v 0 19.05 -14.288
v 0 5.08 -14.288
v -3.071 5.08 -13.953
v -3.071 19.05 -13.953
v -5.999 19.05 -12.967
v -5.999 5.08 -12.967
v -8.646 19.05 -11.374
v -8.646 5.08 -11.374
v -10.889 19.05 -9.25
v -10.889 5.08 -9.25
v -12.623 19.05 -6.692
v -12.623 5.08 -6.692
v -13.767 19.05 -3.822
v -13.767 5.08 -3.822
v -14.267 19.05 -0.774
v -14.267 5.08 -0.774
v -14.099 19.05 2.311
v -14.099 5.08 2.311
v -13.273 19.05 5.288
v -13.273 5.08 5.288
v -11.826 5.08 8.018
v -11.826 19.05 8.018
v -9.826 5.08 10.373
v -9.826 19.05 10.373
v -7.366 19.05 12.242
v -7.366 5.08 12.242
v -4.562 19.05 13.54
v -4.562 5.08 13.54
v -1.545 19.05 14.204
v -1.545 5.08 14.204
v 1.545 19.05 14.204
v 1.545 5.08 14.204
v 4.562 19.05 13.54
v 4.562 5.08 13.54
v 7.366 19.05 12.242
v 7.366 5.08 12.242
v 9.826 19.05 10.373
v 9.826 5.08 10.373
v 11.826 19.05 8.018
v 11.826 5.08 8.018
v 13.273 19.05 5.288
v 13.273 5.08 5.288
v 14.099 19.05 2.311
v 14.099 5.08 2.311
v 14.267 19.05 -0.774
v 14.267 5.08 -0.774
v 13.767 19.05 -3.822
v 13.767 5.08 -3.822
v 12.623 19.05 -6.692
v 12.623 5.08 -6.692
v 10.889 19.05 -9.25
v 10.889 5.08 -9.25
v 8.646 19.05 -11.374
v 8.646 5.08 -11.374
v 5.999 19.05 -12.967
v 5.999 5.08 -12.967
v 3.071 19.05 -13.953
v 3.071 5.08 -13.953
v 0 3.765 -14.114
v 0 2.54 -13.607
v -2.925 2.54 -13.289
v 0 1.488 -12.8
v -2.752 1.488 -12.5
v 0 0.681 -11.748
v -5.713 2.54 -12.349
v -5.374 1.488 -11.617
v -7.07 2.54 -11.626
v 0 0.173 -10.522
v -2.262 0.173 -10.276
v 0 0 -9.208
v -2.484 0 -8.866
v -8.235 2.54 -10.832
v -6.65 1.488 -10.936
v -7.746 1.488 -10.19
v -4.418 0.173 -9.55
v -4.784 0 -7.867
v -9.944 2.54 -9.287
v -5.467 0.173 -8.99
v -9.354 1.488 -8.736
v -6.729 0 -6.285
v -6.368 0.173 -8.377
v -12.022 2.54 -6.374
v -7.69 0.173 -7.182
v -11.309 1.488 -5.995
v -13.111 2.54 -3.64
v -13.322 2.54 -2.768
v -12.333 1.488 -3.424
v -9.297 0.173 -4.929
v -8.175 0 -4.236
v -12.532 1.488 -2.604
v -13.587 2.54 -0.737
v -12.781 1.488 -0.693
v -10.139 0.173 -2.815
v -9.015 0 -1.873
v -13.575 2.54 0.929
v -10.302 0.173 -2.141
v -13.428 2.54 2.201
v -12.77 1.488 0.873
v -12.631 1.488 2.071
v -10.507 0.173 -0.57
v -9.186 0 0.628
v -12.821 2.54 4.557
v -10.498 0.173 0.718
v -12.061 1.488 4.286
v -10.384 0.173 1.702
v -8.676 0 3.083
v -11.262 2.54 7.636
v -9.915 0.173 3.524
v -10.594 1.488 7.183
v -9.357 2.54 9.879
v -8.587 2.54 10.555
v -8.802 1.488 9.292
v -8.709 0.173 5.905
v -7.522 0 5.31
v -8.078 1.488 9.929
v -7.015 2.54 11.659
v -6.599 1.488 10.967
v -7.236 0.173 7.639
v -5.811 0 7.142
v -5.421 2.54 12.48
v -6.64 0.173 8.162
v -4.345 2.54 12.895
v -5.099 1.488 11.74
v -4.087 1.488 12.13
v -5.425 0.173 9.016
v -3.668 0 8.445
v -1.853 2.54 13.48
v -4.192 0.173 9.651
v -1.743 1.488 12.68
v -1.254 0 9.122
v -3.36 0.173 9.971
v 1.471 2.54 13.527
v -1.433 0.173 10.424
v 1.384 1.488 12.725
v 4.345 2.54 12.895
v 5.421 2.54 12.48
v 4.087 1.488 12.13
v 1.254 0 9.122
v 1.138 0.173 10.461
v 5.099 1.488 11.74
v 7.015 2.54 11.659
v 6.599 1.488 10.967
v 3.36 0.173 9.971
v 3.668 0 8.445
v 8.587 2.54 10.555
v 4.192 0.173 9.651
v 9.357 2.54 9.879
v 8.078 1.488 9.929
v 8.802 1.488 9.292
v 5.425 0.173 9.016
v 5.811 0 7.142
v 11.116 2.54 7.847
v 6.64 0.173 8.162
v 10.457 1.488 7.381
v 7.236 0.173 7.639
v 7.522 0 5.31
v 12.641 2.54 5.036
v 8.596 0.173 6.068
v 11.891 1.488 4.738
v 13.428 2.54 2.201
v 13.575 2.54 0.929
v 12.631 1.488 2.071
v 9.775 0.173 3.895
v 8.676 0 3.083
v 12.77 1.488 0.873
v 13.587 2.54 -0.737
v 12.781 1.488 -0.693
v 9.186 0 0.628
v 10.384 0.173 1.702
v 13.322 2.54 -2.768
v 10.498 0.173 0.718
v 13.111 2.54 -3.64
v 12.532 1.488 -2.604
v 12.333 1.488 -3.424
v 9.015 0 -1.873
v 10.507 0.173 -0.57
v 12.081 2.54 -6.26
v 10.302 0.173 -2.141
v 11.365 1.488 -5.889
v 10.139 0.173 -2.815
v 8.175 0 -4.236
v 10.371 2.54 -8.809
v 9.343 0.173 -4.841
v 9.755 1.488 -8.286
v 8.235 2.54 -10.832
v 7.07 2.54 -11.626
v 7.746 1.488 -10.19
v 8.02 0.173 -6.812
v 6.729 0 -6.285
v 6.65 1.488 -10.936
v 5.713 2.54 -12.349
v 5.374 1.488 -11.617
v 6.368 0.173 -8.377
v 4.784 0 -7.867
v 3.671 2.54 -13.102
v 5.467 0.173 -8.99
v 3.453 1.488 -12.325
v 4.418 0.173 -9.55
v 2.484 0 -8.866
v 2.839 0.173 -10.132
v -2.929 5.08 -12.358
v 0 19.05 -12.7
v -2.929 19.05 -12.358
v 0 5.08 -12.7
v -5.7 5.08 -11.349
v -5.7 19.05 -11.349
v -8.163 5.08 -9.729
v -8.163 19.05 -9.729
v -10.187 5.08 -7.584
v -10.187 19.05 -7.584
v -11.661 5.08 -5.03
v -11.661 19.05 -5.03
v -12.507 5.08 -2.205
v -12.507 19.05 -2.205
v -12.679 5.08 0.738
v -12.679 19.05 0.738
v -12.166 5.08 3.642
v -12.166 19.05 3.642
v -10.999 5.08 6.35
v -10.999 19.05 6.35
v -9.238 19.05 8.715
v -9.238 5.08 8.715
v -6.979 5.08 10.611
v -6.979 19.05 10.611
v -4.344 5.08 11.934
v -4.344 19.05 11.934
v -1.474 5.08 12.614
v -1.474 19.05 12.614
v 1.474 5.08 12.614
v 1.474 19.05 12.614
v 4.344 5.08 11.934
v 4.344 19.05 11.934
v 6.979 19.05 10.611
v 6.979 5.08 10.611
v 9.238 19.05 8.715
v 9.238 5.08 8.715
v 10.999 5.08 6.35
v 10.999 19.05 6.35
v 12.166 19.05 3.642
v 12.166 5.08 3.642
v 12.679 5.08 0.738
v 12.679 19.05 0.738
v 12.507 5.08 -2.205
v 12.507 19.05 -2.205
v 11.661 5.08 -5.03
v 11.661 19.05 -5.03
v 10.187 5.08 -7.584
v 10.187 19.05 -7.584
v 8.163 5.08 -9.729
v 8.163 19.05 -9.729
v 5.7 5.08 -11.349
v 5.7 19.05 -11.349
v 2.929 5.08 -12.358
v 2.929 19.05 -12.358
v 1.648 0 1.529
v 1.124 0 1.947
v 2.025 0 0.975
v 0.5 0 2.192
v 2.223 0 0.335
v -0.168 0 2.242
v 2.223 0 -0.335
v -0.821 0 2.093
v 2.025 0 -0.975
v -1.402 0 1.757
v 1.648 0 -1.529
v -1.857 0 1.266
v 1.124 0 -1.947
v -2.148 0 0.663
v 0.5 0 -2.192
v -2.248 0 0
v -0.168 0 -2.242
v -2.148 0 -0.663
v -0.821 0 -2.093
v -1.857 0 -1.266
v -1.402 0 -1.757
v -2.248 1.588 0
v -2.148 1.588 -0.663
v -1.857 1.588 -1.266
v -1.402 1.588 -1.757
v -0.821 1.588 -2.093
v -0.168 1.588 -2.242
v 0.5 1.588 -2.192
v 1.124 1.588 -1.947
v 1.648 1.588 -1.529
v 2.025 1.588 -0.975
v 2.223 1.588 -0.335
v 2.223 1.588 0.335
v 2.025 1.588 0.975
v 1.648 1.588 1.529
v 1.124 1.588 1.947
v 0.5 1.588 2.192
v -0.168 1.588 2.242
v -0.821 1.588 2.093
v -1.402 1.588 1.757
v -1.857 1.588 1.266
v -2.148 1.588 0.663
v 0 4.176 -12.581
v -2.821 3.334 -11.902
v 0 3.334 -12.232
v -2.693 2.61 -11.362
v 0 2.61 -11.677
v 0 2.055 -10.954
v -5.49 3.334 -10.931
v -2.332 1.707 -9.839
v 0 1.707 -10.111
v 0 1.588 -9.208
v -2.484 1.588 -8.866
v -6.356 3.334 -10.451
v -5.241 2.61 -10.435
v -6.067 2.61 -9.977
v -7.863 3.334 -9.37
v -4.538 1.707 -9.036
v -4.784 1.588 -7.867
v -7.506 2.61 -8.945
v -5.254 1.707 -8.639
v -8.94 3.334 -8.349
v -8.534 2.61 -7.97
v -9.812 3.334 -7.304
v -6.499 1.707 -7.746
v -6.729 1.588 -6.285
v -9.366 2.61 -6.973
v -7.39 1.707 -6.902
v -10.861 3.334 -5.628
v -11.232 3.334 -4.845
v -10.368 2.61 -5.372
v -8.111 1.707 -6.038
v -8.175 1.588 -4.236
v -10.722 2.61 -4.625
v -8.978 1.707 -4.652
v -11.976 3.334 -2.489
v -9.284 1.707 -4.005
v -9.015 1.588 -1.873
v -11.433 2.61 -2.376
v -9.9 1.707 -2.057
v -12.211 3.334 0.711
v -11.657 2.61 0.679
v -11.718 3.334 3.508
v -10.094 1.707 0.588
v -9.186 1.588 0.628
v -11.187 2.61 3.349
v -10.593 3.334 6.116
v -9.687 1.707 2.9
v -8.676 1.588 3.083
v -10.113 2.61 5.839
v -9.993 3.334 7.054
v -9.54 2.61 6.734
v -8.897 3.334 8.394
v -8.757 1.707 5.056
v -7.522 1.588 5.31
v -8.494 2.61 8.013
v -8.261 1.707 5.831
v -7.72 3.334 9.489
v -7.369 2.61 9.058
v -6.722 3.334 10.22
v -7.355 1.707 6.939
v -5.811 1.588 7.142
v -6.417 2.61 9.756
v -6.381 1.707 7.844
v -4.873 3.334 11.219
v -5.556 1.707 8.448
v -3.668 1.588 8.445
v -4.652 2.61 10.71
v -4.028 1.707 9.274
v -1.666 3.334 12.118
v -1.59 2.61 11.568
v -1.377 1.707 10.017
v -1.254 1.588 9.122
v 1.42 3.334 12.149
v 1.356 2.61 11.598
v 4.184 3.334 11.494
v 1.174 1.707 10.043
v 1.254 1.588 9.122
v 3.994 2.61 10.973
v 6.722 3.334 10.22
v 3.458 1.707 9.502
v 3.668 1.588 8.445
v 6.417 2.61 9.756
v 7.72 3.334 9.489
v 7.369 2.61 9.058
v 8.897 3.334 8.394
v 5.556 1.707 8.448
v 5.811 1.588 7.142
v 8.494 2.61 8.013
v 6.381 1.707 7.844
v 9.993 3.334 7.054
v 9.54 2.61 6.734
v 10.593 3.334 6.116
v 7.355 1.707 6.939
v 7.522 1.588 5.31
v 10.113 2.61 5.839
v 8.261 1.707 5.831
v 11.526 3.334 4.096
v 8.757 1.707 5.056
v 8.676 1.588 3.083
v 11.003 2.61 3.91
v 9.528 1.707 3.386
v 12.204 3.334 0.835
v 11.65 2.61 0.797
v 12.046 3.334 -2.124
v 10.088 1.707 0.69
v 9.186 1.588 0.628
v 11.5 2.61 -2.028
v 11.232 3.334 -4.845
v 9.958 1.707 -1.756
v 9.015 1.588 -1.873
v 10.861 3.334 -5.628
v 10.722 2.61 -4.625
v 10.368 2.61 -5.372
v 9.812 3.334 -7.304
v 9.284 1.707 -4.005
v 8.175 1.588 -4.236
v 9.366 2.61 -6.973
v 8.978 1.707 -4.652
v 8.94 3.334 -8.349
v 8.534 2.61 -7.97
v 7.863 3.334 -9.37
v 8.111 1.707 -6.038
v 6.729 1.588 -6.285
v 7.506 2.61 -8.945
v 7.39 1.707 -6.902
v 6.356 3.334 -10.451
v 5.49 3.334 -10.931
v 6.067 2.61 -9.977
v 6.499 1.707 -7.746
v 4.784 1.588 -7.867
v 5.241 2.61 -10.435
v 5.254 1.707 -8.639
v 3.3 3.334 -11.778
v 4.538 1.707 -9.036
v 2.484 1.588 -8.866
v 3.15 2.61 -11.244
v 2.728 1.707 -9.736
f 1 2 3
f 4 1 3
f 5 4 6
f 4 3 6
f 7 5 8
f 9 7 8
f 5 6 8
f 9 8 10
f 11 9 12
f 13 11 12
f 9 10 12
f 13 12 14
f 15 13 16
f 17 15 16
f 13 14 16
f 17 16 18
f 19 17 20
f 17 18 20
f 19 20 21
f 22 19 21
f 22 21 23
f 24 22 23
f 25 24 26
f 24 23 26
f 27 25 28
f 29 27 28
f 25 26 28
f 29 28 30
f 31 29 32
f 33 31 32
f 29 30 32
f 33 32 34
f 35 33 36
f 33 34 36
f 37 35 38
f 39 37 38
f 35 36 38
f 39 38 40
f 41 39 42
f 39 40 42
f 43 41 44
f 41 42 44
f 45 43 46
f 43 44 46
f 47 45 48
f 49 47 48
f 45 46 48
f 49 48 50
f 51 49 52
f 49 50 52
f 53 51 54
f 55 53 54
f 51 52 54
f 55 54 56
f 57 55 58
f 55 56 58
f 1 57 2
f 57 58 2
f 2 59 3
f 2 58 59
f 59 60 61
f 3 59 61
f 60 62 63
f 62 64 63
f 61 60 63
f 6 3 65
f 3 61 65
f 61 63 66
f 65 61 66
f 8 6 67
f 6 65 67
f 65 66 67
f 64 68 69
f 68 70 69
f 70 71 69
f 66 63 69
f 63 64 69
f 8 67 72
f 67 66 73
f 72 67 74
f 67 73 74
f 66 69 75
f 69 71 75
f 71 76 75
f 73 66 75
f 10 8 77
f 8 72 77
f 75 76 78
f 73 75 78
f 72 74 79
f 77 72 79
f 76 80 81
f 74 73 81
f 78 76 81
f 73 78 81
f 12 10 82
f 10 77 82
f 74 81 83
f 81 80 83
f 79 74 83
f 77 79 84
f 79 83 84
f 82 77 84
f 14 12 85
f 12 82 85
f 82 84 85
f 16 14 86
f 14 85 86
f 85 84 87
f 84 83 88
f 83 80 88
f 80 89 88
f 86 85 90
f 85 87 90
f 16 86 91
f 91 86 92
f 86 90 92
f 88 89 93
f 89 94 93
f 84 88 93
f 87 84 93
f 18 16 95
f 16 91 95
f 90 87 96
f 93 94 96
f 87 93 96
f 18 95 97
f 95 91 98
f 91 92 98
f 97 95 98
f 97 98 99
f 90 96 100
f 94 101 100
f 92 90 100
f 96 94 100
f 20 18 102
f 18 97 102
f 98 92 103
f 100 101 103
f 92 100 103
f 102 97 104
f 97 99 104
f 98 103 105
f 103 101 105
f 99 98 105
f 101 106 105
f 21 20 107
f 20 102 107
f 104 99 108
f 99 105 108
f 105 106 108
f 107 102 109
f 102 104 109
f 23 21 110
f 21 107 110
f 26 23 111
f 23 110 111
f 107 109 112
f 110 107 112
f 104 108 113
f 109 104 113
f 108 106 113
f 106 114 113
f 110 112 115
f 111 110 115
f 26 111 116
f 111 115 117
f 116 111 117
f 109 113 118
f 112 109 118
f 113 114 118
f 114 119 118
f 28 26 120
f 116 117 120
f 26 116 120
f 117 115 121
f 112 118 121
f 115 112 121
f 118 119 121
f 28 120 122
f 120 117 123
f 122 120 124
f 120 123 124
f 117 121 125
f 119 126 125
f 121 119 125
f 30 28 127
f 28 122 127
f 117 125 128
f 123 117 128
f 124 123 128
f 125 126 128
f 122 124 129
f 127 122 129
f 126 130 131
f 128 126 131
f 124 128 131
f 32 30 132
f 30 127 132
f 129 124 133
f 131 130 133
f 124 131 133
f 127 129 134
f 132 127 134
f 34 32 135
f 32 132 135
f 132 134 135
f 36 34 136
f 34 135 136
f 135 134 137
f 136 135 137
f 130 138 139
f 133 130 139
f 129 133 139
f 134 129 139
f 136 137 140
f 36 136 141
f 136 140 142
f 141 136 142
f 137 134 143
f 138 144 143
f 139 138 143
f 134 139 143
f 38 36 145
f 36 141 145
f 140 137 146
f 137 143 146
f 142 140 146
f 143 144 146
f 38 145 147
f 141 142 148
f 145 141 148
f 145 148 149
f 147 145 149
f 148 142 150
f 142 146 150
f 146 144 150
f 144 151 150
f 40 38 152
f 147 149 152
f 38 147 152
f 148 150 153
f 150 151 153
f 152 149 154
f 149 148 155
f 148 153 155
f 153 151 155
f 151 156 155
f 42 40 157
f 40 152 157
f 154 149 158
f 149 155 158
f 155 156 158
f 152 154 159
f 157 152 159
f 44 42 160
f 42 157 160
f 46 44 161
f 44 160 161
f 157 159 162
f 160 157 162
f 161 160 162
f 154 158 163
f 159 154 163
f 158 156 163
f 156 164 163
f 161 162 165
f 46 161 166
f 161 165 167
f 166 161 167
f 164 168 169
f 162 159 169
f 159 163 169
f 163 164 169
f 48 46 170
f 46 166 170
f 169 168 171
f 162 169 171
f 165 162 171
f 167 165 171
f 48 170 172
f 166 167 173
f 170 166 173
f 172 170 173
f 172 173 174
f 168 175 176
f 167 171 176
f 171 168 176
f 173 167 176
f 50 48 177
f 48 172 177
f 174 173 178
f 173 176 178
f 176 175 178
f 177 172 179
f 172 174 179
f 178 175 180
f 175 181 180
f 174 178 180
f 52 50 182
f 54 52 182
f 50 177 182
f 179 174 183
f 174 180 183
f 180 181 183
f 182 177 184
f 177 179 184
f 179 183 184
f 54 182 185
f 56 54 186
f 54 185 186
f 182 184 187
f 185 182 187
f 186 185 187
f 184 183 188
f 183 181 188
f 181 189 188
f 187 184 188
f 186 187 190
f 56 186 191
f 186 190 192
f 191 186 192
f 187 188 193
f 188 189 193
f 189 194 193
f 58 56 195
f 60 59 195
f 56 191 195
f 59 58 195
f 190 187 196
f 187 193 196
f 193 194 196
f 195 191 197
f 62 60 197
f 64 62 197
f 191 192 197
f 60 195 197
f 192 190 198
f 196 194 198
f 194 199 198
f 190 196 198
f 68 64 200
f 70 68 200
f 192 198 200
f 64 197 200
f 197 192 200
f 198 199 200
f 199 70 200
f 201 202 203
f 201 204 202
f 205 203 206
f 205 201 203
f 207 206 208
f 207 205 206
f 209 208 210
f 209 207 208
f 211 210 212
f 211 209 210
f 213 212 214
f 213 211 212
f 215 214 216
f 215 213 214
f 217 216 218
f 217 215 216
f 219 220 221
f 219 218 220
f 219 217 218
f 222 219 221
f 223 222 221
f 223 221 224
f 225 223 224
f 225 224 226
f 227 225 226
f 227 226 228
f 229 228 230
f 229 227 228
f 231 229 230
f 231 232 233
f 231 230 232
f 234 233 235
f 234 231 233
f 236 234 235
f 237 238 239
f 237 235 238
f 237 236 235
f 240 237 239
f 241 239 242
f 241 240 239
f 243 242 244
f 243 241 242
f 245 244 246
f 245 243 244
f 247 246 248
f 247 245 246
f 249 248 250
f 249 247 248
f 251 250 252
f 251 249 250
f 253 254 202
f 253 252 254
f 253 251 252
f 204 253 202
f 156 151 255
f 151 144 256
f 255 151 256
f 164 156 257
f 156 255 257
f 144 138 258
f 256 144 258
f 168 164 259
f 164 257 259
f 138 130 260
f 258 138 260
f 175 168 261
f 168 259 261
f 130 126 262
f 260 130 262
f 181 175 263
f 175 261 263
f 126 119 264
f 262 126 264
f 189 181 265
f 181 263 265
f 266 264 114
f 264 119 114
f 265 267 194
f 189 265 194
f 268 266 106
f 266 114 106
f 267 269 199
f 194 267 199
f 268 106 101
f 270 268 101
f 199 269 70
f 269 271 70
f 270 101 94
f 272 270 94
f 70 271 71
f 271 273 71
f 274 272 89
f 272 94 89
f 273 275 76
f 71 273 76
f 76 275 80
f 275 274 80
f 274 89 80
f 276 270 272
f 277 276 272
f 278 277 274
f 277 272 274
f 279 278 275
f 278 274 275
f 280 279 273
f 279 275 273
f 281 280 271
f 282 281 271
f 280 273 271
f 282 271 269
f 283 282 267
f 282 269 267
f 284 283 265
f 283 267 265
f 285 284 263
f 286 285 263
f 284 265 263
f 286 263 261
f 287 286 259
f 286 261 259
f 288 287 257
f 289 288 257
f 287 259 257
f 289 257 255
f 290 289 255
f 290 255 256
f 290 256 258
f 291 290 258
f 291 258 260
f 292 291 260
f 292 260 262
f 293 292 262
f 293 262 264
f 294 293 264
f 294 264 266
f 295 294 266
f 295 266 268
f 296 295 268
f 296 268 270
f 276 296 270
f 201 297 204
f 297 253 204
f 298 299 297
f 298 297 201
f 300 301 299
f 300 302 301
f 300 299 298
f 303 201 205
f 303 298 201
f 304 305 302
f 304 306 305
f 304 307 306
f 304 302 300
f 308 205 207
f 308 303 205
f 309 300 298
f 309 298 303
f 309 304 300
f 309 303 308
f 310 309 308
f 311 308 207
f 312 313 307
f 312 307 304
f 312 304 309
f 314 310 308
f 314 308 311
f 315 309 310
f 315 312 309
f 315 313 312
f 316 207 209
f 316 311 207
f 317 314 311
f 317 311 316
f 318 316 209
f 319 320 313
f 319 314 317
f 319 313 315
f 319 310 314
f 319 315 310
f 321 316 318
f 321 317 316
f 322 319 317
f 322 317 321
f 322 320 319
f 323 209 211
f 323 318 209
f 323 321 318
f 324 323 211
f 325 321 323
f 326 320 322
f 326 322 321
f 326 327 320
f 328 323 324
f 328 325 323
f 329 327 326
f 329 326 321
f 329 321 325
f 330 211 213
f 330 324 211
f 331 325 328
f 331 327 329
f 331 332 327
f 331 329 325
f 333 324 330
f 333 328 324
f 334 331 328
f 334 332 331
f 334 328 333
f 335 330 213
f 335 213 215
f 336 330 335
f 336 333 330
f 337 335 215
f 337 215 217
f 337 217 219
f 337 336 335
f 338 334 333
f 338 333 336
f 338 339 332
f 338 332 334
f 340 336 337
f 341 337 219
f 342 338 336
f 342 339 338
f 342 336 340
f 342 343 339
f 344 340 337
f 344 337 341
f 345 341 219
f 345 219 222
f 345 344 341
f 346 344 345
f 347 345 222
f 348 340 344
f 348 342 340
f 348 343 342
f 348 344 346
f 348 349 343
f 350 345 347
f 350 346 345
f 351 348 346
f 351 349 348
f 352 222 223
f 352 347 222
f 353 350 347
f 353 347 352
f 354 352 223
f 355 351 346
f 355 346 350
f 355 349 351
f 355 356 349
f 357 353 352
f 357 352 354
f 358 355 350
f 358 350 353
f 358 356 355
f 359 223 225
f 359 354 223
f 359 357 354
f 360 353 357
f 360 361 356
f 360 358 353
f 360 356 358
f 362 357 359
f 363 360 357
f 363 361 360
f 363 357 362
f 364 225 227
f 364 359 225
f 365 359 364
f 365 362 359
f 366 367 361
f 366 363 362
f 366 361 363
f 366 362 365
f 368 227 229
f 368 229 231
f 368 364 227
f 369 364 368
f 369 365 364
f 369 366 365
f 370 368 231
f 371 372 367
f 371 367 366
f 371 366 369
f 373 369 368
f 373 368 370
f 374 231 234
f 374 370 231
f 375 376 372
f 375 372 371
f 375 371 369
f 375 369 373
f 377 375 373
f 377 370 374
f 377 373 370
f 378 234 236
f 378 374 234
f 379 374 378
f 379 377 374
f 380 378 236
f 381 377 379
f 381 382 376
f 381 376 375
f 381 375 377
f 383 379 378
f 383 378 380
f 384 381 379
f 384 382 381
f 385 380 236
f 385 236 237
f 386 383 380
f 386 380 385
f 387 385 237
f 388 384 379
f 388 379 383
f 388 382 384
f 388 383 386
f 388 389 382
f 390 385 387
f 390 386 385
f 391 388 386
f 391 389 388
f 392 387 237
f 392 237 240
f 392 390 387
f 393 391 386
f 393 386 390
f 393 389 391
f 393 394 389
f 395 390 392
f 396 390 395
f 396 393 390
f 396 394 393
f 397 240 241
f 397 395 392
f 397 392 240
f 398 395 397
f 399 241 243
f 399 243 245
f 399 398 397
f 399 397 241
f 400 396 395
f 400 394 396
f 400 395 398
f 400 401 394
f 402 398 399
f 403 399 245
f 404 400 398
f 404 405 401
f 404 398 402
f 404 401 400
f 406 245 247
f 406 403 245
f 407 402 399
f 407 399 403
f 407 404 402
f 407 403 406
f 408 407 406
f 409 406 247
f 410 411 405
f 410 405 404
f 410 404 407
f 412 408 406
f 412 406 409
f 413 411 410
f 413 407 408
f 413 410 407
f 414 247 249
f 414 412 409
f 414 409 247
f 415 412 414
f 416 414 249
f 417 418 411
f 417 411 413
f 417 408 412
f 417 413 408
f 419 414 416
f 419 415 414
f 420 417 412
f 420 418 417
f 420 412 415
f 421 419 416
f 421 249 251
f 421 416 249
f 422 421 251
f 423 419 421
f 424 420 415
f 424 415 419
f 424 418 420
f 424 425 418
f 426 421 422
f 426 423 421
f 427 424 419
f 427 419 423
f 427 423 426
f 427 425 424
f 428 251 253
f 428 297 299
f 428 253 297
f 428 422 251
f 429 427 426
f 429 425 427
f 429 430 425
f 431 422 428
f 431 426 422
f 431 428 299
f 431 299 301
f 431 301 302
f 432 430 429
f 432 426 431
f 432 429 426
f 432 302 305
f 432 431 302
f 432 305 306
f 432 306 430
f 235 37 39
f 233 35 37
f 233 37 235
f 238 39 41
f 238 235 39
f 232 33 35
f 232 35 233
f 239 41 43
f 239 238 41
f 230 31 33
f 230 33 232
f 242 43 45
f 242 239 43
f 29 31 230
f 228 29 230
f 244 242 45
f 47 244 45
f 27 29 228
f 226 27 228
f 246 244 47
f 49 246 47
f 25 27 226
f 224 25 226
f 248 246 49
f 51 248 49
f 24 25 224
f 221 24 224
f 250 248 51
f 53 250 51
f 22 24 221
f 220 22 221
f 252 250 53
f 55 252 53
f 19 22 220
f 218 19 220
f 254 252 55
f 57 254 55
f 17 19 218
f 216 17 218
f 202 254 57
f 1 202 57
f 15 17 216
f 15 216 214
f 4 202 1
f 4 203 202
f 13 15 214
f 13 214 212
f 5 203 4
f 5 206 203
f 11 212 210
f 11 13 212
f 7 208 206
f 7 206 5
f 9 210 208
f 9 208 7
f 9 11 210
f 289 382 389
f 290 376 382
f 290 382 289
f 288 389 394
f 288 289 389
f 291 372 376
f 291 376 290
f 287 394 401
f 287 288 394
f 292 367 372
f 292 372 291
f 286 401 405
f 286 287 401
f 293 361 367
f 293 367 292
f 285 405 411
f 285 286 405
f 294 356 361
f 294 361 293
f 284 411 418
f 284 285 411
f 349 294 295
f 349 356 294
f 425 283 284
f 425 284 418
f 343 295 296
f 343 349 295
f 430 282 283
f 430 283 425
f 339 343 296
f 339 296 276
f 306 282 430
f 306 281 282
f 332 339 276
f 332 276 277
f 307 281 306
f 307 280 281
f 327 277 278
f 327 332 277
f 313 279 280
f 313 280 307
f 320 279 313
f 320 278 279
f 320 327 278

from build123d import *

# Parameters (mm, degrees)
SKETCH1_R                 = 14.2875
BOSS_EXTRUDE1_DEPTH       = 19.05
FILLET1_R                 = 5.08
SHELL1_T                  = -1.5875
F_8_CLEARANCE_HOLE1_D     = 4.4958
F_8_CLEARANCE_HOLE1_DEPTH = 6.35
F_8_CLEARANCE_HOLE1_TIP   = 1.350674586


with BuildPart() as part:
    # Sketch1 → Boss-Extrude1 (new body)
    with BuildSketch(Plane(origin=(0, 0, 0), x_dir=(1, 0, 0), z_dir=(0, 1, 0))):
        with Locations(Location((0, 0, 0), (0, 0, 90))):
            Circle(SKETCH1_R)
    extrude(amount=BOSS_EXTRUDE1_DEPTH)

    # Fillet1
    fillet1_edges = [part.edges().sort_by_distance(p)[0] for p in [
        (0, 0, 14.2875),
    ]]
    fillet(fillet1_edges, radius=FILLET1_R)

    # Shell1
    shell1_openings = [part.faces().sort_by_distance(p)[0] for p in [
        (0, 19.05, 0),
    ]]
    offset(amount=SHELL1_T, openings=shell1_openings, kind=Kind.INTERSECTION)

    # #8 Clearance Hole1
    with Locations(Plane(origin=(0, 1.5875, 0), x_dir=(1, 0, 0), z_dir=(0, 1, 0))):
        with Locations((0, 0)):
            Hole(F_8_CLEARANCE_HOLE1_D / 2, depth=F_8_CLEARANCE_HOLE1_DEPTH)
            with Locations((0, 0, -(F_8_CLEARANCE_HOLE1_DEPTH + F_8_CLEARANCE_HOLE1_TIP / 2))):  # 118° drill point
                Cone(0, F_8_CLEARANCE_HOLE1_D / 2, F_8_CLEARANCE_HOLE1_TIP, mode=Mode.SUBTRACT)


solid = part.part
